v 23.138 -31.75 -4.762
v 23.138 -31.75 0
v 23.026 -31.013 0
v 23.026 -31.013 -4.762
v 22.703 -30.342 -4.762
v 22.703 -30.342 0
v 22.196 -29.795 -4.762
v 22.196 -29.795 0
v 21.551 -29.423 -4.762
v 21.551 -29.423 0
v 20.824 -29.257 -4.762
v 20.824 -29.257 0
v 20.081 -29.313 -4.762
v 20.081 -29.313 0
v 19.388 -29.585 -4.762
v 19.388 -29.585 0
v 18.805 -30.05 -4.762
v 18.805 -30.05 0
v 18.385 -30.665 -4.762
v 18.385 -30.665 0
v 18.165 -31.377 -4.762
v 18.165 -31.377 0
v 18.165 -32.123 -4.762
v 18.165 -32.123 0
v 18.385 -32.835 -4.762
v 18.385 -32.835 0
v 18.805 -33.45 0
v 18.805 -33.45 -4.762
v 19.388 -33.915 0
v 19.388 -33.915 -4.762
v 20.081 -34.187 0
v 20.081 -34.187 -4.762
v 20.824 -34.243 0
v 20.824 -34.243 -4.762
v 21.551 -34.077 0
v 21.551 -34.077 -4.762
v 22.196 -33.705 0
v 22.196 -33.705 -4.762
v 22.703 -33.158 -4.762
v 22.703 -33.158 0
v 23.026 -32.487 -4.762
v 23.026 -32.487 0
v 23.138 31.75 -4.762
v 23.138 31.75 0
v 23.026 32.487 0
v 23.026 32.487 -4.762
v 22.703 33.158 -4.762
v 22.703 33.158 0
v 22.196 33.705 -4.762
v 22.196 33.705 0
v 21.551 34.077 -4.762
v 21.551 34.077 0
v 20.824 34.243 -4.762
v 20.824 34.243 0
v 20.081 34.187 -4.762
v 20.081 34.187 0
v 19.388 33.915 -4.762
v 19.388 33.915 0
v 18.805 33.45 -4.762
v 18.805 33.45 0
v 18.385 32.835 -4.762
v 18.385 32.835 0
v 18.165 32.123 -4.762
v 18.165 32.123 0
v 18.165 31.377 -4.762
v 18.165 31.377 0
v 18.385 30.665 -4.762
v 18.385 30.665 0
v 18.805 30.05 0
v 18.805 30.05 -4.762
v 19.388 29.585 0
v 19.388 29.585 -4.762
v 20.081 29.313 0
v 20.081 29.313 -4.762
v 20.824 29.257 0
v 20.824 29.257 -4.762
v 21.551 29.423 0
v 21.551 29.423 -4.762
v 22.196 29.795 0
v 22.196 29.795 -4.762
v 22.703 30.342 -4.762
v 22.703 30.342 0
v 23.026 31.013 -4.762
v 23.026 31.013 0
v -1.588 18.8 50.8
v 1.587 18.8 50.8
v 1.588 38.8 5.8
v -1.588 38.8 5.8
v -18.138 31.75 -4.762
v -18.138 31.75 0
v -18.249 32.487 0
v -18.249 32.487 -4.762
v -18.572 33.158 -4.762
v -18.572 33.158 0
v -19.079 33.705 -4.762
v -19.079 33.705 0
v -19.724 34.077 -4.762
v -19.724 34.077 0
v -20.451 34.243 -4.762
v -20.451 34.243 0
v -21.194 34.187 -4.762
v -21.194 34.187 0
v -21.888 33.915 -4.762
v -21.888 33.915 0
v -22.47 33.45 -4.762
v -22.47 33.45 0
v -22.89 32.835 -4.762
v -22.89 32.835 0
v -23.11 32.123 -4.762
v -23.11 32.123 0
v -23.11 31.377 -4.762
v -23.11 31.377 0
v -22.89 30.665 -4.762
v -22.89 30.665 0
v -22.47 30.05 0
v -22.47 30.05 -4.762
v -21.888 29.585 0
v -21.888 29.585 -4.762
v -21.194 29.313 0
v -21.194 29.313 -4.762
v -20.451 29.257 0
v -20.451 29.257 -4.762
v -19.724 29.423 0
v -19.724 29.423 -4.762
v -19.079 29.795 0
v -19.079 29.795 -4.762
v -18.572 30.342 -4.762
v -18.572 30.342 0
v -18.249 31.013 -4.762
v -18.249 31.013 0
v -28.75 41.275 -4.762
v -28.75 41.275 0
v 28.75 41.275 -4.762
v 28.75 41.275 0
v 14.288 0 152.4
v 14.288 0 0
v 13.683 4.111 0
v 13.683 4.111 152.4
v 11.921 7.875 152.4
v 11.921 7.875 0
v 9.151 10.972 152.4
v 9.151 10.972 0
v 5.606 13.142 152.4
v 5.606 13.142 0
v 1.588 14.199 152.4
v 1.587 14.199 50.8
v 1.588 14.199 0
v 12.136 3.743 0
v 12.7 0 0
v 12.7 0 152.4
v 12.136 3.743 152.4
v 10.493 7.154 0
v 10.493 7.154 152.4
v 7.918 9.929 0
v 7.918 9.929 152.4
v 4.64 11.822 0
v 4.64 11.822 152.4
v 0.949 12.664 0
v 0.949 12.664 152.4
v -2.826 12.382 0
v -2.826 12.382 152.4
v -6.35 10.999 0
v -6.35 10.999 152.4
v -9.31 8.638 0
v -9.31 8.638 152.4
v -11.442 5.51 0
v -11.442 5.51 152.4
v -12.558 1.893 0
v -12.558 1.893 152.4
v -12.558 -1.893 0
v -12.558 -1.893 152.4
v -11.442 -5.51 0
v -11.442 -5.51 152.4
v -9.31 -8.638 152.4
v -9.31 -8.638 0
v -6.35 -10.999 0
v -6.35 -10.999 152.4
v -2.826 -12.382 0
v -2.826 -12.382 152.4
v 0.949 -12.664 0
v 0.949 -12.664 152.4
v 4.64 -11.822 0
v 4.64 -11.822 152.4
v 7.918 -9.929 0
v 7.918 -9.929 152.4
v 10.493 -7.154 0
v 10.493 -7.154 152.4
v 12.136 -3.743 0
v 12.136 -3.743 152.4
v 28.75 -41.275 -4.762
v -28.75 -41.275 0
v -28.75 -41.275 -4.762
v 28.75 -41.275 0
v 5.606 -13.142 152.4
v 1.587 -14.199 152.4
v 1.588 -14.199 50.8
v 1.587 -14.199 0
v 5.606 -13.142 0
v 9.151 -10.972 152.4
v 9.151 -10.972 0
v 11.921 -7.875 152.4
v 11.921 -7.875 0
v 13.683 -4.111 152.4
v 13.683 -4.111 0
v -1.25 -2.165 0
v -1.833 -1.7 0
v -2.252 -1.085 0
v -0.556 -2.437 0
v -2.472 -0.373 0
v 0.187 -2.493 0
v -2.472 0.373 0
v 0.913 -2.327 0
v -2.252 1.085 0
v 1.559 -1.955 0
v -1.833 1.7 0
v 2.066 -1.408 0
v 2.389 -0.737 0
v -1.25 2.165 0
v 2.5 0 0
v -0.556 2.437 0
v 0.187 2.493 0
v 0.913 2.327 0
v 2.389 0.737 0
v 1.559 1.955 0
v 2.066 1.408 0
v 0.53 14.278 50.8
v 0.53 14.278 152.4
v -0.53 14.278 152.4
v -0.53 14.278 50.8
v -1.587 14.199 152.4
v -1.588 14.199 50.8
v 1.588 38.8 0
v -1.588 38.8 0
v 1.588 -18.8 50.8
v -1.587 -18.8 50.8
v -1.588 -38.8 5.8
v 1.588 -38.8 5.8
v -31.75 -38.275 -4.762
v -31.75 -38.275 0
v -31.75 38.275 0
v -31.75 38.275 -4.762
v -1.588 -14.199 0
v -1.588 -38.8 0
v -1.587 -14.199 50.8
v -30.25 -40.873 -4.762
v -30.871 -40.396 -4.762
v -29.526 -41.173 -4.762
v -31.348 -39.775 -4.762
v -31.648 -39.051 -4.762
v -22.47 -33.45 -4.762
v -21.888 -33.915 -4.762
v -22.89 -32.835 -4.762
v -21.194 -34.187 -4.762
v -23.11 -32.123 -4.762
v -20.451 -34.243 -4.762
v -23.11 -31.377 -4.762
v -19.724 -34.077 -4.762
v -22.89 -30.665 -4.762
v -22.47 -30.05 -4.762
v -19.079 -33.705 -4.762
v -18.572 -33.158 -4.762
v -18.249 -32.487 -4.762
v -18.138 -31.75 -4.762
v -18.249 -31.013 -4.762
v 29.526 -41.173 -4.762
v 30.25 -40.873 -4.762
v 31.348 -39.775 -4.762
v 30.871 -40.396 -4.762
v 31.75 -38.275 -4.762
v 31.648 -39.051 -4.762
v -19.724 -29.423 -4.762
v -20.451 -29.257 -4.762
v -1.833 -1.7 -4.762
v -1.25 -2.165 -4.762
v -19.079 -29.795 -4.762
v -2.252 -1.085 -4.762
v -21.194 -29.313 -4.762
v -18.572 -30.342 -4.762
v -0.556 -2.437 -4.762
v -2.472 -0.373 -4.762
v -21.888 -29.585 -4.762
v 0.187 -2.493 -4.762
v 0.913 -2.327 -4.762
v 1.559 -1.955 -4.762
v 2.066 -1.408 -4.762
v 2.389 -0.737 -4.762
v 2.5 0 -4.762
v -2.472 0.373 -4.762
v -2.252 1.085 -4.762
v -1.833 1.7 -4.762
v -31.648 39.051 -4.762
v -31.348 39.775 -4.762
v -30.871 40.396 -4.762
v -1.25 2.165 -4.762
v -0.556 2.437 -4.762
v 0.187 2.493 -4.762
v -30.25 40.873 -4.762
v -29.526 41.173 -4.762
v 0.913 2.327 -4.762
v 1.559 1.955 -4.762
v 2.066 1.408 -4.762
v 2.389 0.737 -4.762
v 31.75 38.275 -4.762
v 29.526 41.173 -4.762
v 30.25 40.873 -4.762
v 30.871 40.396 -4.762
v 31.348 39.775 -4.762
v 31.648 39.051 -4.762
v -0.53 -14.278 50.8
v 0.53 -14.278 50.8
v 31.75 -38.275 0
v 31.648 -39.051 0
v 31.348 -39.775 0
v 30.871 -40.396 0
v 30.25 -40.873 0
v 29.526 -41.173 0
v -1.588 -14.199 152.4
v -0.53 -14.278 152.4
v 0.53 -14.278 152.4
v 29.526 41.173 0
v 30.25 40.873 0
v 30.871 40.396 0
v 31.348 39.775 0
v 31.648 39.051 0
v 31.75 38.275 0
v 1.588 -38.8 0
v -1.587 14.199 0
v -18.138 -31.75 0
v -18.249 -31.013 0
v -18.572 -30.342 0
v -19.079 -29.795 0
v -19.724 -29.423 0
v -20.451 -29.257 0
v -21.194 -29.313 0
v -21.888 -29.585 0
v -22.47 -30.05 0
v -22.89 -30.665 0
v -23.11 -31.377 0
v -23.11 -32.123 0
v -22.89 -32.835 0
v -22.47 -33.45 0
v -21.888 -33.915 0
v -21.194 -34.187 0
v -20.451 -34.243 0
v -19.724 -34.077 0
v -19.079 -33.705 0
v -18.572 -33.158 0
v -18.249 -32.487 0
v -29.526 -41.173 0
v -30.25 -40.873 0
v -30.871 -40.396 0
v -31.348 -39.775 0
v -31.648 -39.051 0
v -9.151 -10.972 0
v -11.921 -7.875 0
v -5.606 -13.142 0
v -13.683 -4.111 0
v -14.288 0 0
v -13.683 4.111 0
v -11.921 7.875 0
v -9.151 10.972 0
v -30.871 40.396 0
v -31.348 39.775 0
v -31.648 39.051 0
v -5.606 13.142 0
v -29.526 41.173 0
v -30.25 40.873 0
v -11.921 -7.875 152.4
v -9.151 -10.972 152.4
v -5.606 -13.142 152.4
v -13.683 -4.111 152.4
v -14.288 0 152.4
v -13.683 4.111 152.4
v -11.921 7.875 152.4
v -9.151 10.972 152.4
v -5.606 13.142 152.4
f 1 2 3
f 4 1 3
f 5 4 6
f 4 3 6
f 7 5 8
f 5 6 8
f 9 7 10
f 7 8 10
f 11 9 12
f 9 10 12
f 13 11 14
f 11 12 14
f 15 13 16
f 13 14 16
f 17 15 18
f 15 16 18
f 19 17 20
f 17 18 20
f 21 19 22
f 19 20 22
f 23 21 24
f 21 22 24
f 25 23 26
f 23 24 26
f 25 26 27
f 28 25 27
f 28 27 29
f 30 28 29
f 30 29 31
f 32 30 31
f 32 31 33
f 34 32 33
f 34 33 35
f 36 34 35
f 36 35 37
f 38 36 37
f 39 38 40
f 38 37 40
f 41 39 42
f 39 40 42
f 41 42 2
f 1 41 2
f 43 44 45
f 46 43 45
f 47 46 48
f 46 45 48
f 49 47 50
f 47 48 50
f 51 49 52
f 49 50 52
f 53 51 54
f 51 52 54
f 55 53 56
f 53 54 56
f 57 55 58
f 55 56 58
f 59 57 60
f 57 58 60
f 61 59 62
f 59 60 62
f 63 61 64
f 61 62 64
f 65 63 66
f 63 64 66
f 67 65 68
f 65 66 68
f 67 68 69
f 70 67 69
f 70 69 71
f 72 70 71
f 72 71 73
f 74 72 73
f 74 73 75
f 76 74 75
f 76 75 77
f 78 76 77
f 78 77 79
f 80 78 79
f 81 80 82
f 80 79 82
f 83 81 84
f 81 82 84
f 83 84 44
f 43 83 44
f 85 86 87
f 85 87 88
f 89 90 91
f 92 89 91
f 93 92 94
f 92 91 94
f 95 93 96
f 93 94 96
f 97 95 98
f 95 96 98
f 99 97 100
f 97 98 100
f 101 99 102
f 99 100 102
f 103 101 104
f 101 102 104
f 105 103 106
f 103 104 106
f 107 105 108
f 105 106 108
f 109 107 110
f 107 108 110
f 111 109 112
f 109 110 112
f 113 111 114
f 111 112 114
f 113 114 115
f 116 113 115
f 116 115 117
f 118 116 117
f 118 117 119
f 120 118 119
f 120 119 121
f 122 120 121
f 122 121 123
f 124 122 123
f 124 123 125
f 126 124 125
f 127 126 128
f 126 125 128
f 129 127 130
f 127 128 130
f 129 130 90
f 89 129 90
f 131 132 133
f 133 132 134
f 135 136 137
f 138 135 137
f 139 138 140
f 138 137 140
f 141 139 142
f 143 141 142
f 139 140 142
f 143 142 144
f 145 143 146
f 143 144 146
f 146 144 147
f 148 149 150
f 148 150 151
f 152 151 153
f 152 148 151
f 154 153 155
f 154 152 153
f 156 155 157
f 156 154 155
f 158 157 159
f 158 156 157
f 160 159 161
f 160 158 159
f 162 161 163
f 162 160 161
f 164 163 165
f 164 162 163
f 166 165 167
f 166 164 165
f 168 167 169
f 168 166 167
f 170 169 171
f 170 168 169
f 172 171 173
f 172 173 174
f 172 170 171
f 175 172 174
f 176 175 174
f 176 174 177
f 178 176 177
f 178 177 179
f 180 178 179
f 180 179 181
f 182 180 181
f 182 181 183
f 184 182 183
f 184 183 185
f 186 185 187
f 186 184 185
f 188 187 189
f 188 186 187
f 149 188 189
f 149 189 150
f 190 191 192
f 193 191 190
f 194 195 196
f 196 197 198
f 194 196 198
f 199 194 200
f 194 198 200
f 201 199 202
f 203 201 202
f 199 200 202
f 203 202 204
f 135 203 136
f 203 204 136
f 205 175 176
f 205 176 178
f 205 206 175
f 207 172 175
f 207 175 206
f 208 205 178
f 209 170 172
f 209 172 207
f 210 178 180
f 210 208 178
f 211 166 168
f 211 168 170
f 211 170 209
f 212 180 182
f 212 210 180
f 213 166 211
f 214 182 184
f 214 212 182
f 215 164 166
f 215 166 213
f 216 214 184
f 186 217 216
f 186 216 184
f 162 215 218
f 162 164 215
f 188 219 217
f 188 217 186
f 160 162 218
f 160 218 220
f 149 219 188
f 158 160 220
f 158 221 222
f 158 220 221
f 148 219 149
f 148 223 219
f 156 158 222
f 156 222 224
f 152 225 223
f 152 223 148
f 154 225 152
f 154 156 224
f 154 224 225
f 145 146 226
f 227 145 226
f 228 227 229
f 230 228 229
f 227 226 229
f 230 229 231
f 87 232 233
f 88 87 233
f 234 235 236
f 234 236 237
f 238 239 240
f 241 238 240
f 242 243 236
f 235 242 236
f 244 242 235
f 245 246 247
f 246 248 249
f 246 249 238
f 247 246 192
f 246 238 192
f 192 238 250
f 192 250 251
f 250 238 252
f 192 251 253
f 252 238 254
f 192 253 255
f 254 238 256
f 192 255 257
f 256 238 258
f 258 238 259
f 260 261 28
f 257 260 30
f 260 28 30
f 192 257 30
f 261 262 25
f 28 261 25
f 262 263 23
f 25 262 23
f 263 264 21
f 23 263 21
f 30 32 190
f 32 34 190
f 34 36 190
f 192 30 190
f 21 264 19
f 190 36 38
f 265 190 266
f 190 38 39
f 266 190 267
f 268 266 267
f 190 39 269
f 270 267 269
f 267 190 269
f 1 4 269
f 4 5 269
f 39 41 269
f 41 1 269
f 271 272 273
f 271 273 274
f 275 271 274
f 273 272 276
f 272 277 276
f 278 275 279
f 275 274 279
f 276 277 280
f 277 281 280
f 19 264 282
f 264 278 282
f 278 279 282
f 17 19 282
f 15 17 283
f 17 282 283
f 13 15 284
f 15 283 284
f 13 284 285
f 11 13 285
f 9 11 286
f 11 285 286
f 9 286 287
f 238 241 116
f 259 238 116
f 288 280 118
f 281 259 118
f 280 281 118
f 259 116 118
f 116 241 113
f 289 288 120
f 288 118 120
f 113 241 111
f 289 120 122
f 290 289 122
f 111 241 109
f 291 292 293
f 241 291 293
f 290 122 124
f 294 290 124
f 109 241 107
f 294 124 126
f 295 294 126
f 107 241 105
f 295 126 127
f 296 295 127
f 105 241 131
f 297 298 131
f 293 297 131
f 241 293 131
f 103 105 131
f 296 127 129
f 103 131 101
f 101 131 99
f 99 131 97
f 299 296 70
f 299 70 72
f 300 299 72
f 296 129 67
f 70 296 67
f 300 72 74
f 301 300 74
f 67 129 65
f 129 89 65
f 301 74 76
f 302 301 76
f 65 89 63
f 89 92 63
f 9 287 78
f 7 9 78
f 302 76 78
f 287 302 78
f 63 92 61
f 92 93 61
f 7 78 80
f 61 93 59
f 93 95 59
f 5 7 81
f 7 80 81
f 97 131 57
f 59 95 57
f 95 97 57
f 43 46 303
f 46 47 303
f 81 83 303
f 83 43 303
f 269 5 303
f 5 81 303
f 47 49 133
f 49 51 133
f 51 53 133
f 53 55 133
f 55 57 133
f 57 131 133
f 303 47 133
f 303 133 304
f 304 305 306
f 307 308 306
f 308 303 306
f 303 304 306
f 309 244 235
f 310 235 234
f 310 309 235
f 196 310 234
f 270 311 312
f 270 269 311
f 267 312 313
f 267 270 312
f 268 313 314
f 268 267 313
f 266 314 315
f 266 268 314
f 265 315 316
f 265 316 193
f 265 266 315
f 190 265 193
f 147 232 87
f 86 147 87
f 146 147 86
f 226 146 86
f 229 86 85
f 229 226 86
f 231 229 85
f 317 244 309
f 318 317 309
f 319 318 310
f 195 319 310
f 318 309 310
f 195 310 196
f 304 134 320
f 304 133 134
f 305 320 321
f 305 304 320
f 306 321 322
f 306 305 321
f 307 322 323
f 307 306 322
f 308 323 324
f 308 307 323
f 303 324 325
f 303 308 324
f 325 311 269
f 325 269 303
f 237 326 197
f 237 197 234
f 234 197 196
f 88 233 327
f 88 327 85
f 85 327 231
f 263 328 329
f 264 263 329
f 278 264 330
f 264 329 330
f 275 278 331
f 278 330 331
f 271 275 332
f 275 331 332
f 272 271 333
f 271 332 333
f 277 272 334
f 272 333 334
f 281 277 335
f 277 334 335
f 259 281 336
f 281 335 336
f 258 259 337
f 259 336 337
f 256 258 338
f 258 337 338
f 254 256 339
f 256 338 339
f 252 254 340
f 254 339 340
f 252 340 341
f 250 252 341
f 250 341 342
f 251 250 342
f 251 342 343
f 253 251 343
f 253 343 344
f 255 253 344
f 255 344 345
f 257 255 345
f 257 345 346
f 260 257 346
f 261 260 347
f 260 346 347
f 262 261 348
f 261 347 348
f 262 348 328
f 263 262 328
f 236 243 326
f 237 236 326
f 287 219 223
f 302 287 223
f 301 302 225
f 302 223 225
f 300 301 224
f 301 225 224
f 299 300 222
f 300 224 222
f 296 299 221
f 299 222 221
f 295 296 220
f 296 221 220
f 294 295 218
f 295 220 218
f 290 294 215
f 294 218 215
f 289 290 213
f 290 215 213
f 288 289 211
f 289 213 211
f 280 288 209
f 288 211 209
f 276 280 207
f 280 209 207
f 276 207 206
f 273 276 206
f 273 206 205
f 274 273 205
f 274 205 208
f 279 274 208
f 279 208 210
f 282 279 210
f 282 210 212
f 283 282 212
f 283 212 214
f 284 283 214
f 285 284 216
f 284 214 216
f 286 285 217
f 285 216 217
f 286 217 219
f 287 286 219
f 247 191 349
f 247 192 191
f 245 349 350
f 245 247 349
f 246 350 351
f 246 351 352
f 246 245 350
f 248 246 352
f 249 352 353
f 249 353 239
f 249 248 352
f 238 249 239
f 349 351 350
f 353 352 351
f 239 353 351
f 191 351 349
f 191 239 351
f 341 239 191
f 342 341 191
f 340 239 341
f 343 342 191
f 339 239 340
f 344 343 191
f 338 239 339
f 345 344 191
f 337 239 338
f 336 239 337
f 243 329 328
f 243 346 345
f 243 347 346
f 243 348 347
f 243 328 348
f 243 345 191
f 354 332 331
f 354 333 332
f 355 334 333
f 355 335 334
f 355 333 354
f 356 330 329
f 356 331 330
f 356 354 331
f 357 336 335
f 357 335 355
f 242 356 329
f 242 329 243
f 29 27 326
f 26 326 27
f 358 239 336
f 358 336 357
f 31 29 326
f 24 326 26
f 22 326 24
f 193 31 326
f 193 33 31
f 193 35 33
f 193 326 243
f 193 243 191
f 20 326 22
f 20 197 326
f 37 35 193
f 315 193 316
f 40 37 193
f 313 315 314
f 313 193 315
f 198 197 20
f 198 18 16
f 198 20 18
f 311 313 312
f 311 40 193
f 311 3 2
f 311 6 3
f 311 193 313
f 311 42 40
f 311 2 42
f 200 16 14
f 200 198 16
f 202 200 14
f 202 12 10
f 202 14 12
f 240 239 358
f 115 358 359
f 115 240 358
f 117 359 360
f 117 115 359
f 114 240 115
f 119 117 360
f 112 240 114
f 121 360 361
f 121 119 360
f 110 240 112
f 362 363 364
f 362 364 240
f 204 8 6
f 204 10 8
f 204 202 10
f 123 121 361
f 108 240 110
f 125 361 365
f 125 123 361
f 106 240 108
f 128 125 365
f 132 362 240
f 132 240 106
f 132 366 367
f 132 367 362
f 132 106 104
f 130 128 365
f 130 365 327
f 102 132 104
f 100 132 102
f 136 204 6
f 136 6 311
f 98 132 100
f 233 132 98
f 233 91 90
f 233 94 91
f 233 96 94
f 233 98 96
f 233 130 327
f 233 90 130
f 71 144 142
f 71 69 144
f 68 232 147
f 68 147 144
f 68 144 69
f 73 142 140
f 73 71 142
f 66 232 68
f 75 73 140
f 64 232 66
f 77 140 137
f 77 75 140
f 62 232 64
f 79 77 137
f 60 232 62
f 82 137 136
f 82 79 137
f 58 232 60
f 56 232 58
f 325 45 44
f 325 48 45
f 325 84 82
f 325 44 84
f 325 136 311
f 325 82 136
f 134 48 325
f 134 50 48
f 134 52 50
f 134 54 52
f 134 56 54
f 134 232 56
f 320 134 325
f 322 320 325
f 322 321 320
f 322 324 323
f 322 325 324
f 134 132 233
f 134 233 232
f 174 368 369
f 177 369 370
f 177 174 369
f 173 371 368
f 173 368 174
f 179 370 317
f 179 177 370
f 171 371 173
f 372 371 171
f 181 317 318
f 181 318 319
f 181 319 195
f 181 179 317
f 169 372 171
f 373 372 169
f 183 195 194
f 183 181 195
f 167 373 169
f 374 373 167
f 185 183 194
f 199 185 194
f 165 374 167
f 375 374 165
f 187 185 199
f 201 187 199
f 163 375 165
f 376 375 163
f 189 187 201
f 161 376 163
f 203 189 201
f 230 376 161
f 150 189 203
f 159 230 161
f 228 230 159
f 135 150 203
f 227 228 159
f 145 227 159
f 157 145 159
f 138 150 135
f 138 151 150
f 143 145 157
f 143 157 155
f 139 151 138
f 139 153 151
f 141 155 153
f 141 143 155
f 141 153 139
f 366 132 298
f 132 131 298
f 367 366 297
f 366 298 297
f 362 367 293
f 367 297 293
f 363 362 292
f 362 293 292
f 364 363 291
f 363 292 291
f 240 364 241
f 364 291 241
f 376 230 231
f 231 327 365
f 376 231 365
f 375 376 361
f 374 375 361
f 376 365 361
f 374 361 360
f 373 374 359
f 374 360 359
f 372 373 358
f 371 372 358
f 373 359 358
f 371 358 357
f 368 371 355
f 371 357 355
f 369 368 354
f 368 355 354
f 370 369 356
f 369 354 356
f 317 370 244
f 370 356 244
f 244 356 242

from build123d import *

# Parameters (mm, degrees)
F0_W     = 63.5
F0_H     = 82.55
F0_R     = 2.5
F0_R_2   = 12.7
F1_DEPTH = 4.7625
F2_DEPTH = 152.4
F3_DEPTH = 50.8
F4_DEPTH = 7.05
F5_DEPTH = 7.05
F6_R     = 3
F7_SIZE2 = 20
F7_SIZE  = 45
F8_SIZE2 = 20
F8_SIZE  = 45


with BuildPart() as f1:
    # F0 (on Top) → F1 (new body)
    with BuildSketch(Plane.XY):
        Rectangle(F0_W, F0_H)
        with Locations((-20.6375, -31.75)):
            Circle(F0_R, mode=Mode.SUBTRACT)
        with Locations((20.6375, -31.75)):
            Circle(F0_R, mode=Mode.SUBTRACT)
        with Locations((-20.6375, 25.4)):
            Circle(F0_R, mode=Mode.SUBTRACT)
        with Locations((-20.6375, 31.75)):
            Circle(F0_R, mode=Mode.SUBTRACT)
        with BuildLine():
            ThreePointArc((1.5875, 14.1990316571), (10.6492737428, 9.525), (14.2875, 0))
            ThreePointArc((14.2875, 0), (10.6492737428, -9.525), (1.5875, -14.1990316571))
            Line((1.5875, -14.1990316571), (1.5875, -31.75))
            Line((1.5875, -31.75), (0, -31.75))
            Line((0, -31.75), (-1.5875, -31.75))
            Line((-1.5875, -31.75), (-1.5875, -14.1990316571))
            ThreePointArc((-1.5875, -14.1990316571), (-14.2875, 0), (-1.5875, 14.1990316571))
            Line((-1.5875, 14.1990316571), (-1.5875, 31.75))
            Line((-1.5875, 31.75), (0, 31.75))
            Line((0, 31.75), (1.5875, 31.75))
            Line((1.5875, 31.75), (1.5875, 14.1990316571))
        make_face(mode=Mode.SUBTRACT)
        with Locations((20.6375, 25.4)):
            Circle(F0_R, mode=Mode.SUBTRACT)
        with Locations((20.6375, 31.75)):
            Circle(F0_R, mode=Mode.SUBTRACT)
        with BuildLine():
            Line((1.5875, -31.75), (1.5875, -14.1990316571))
            ThreePointArc((1.5875, -14.1990316571), (0, -14.2875), (-1.5875, -14.1990316571))
            Line((-1.5875, -14.1990316571), (-1.5875, -31.75))
            Line((-1.5875, -31.75), (0, -31.75))
            Line((0, -31.75), (1.5875, -31.75))
        make_face()
        with BuildLine():
            ThreePointArc((1.5875, -14.1990316571), (10.6492737428, -9.525), (14.2875, 0))
            ThreePointArc((14.2875, 0), (10.6492737428, 9.525), (1.5875, 14.1990316571))
            ThreePointArc((1.5875, 14.1990316571), (0, 14.2875), (-1.5875, 14.1990316571))
            ThreePointArc((-1.5875, 14.1990316571), (-14.2875, 0), (-1.5875, -14.1990316571))
            ThreePointArc((-1.5875, -14.1990316571), (0, -14.2875), (1.5875, -14.1990316571))
        make_face()
        Circle(F0_R_2, mode=Mode.SUBTRACT)
        Circle(F0_R_2)
        Circle(F0_R, mode=Mode.SUBTRACT)
        with BuildLine():
            ThreePointArc((-1.5875, 14.1990316571), (0, 14.2875), (1.5875, 14.1990316571))
            Line((1.5875, 14.1990316571), (1.5875, 31.75))
            Line((1.5875, 31.75), (0, 31.75))
            Line((0, 31.75), (-1.5875, 31.75))
            Line((-1.5875, 31.75), (-1.5875, 14.1990316571))
        make_face()
        with Locations((-20.6375, 25.4)):
            Circle(F0_R)
        with Locations((20.6375, 25.4)):
            Circle(F0_R)
    extrude(amount=-F1_DEPTH)

    # F0 (on Top) → F2 (join)
    with BuildSketch(Plane.XY):
        with BuildLine():
            ThreePointArc((1.5875, -14.1990316571), (10.6492737428, -9.525), (14.2875, 0))
            ThreePointArc((14.2875, 0), (10.6492737428, 9.525), (1.5875, 14.1990316571))
            ThreePointArc((1.5875, 14.1990316571), (0, 14.2875), (-1.5875, 14.1990316571))
            ThreePointArc((-1.5875, 14.1990316571), (-14.2875, 0), (-1.5875, -14.1990316571))
            ThreePointArc((-1.5875, -14.1990316571), (0, -14.2875), (1.5875, -14.1990316571))
        make_face()
        Circle(F0_R_2, mode=Mode.SUBTRACT)
    extrude(amount=F2_DEPTH)

    # F0 (on Top) → F3 (join)
    with BuildSketch(Plane.XY):
        with BuildLine():
            Line((1.5875, -31.75), (1.5875, -14.1990316571))
            ThreePointArc((1.5875, -14.1990316571), (0, -14.2875), (-1.5875, -14.1990316571))
            Line((-1.5875, -14.1990316571), (-1.5875, -31.75))
            Line((-1.5875, -31.75), (0, -31.75))
            Line((0, -31.75), (1.5875, -31.75))
        make_face()
        with BuildLine():
            ThreePointArc((-1.5875, 14.1990316571), (0, 14.2875), (1.5875, 14.1990316571))
            Line((1.5875, 14.1990316571), (1.5875, 31.75))
            Line((1.5875, 31.75), (0, 31.75))
            Line((0, 31.75), (-1.5875, 31.75))
            Line((-1.5875, 31.75), (-1.5875, 14.1990316571))
        make_face()
    extrude(amount=F3_DEPTH)

    # F4 (add): a face of the model
    f4_faces = [f1.faces().sort_by_distance(p)[0] for p in [
        (0, -31.75, 25.4),
    ]]
    extrude(f4_faces, amount=F4_DEPTH)

    # F5 (add): a face of the model
    f5_faces = [f1.faces().sort_by_distance(p)[0] for p in [
        (0, 31.75, 25.4),
    ]]
    extrude(f5_faces, amount=F5_DEPTH)

    # F6
    f6_edges = [f1.edges().sort_by_distance(p)[0] for p in [
        (31.75, -41.275, -2.38125),
        (31.75, 41.275, -2.38125),
        (-31.75, 41.275, -2.38125),
        (-31.75, -41.275, -2.38125),
    ]]
    fillet(f6_edges, radius=F6_R)

    # F7
    f7_edges = [f1.edges().sort_by_distance(p)[0] for p in [
        (0, -38.8, 50.8),
    ]]
    f7_side = f1.faces().sort_by_distance((0, -38.8, 25.4))[0]
    chamfer(f7_edges, length=F7_SIZE, length2=F7_SIZE2, reference=f7_side)

    # F8
    f8_edges = [f1.edges().sort_by_distance(p)[0] for p in [
        (0, 38.8, 50.8),
    ]]
    chamfer(f8_edges, length=F8_SIZE, length2=F8_SIZE2)


solid = f1.part
